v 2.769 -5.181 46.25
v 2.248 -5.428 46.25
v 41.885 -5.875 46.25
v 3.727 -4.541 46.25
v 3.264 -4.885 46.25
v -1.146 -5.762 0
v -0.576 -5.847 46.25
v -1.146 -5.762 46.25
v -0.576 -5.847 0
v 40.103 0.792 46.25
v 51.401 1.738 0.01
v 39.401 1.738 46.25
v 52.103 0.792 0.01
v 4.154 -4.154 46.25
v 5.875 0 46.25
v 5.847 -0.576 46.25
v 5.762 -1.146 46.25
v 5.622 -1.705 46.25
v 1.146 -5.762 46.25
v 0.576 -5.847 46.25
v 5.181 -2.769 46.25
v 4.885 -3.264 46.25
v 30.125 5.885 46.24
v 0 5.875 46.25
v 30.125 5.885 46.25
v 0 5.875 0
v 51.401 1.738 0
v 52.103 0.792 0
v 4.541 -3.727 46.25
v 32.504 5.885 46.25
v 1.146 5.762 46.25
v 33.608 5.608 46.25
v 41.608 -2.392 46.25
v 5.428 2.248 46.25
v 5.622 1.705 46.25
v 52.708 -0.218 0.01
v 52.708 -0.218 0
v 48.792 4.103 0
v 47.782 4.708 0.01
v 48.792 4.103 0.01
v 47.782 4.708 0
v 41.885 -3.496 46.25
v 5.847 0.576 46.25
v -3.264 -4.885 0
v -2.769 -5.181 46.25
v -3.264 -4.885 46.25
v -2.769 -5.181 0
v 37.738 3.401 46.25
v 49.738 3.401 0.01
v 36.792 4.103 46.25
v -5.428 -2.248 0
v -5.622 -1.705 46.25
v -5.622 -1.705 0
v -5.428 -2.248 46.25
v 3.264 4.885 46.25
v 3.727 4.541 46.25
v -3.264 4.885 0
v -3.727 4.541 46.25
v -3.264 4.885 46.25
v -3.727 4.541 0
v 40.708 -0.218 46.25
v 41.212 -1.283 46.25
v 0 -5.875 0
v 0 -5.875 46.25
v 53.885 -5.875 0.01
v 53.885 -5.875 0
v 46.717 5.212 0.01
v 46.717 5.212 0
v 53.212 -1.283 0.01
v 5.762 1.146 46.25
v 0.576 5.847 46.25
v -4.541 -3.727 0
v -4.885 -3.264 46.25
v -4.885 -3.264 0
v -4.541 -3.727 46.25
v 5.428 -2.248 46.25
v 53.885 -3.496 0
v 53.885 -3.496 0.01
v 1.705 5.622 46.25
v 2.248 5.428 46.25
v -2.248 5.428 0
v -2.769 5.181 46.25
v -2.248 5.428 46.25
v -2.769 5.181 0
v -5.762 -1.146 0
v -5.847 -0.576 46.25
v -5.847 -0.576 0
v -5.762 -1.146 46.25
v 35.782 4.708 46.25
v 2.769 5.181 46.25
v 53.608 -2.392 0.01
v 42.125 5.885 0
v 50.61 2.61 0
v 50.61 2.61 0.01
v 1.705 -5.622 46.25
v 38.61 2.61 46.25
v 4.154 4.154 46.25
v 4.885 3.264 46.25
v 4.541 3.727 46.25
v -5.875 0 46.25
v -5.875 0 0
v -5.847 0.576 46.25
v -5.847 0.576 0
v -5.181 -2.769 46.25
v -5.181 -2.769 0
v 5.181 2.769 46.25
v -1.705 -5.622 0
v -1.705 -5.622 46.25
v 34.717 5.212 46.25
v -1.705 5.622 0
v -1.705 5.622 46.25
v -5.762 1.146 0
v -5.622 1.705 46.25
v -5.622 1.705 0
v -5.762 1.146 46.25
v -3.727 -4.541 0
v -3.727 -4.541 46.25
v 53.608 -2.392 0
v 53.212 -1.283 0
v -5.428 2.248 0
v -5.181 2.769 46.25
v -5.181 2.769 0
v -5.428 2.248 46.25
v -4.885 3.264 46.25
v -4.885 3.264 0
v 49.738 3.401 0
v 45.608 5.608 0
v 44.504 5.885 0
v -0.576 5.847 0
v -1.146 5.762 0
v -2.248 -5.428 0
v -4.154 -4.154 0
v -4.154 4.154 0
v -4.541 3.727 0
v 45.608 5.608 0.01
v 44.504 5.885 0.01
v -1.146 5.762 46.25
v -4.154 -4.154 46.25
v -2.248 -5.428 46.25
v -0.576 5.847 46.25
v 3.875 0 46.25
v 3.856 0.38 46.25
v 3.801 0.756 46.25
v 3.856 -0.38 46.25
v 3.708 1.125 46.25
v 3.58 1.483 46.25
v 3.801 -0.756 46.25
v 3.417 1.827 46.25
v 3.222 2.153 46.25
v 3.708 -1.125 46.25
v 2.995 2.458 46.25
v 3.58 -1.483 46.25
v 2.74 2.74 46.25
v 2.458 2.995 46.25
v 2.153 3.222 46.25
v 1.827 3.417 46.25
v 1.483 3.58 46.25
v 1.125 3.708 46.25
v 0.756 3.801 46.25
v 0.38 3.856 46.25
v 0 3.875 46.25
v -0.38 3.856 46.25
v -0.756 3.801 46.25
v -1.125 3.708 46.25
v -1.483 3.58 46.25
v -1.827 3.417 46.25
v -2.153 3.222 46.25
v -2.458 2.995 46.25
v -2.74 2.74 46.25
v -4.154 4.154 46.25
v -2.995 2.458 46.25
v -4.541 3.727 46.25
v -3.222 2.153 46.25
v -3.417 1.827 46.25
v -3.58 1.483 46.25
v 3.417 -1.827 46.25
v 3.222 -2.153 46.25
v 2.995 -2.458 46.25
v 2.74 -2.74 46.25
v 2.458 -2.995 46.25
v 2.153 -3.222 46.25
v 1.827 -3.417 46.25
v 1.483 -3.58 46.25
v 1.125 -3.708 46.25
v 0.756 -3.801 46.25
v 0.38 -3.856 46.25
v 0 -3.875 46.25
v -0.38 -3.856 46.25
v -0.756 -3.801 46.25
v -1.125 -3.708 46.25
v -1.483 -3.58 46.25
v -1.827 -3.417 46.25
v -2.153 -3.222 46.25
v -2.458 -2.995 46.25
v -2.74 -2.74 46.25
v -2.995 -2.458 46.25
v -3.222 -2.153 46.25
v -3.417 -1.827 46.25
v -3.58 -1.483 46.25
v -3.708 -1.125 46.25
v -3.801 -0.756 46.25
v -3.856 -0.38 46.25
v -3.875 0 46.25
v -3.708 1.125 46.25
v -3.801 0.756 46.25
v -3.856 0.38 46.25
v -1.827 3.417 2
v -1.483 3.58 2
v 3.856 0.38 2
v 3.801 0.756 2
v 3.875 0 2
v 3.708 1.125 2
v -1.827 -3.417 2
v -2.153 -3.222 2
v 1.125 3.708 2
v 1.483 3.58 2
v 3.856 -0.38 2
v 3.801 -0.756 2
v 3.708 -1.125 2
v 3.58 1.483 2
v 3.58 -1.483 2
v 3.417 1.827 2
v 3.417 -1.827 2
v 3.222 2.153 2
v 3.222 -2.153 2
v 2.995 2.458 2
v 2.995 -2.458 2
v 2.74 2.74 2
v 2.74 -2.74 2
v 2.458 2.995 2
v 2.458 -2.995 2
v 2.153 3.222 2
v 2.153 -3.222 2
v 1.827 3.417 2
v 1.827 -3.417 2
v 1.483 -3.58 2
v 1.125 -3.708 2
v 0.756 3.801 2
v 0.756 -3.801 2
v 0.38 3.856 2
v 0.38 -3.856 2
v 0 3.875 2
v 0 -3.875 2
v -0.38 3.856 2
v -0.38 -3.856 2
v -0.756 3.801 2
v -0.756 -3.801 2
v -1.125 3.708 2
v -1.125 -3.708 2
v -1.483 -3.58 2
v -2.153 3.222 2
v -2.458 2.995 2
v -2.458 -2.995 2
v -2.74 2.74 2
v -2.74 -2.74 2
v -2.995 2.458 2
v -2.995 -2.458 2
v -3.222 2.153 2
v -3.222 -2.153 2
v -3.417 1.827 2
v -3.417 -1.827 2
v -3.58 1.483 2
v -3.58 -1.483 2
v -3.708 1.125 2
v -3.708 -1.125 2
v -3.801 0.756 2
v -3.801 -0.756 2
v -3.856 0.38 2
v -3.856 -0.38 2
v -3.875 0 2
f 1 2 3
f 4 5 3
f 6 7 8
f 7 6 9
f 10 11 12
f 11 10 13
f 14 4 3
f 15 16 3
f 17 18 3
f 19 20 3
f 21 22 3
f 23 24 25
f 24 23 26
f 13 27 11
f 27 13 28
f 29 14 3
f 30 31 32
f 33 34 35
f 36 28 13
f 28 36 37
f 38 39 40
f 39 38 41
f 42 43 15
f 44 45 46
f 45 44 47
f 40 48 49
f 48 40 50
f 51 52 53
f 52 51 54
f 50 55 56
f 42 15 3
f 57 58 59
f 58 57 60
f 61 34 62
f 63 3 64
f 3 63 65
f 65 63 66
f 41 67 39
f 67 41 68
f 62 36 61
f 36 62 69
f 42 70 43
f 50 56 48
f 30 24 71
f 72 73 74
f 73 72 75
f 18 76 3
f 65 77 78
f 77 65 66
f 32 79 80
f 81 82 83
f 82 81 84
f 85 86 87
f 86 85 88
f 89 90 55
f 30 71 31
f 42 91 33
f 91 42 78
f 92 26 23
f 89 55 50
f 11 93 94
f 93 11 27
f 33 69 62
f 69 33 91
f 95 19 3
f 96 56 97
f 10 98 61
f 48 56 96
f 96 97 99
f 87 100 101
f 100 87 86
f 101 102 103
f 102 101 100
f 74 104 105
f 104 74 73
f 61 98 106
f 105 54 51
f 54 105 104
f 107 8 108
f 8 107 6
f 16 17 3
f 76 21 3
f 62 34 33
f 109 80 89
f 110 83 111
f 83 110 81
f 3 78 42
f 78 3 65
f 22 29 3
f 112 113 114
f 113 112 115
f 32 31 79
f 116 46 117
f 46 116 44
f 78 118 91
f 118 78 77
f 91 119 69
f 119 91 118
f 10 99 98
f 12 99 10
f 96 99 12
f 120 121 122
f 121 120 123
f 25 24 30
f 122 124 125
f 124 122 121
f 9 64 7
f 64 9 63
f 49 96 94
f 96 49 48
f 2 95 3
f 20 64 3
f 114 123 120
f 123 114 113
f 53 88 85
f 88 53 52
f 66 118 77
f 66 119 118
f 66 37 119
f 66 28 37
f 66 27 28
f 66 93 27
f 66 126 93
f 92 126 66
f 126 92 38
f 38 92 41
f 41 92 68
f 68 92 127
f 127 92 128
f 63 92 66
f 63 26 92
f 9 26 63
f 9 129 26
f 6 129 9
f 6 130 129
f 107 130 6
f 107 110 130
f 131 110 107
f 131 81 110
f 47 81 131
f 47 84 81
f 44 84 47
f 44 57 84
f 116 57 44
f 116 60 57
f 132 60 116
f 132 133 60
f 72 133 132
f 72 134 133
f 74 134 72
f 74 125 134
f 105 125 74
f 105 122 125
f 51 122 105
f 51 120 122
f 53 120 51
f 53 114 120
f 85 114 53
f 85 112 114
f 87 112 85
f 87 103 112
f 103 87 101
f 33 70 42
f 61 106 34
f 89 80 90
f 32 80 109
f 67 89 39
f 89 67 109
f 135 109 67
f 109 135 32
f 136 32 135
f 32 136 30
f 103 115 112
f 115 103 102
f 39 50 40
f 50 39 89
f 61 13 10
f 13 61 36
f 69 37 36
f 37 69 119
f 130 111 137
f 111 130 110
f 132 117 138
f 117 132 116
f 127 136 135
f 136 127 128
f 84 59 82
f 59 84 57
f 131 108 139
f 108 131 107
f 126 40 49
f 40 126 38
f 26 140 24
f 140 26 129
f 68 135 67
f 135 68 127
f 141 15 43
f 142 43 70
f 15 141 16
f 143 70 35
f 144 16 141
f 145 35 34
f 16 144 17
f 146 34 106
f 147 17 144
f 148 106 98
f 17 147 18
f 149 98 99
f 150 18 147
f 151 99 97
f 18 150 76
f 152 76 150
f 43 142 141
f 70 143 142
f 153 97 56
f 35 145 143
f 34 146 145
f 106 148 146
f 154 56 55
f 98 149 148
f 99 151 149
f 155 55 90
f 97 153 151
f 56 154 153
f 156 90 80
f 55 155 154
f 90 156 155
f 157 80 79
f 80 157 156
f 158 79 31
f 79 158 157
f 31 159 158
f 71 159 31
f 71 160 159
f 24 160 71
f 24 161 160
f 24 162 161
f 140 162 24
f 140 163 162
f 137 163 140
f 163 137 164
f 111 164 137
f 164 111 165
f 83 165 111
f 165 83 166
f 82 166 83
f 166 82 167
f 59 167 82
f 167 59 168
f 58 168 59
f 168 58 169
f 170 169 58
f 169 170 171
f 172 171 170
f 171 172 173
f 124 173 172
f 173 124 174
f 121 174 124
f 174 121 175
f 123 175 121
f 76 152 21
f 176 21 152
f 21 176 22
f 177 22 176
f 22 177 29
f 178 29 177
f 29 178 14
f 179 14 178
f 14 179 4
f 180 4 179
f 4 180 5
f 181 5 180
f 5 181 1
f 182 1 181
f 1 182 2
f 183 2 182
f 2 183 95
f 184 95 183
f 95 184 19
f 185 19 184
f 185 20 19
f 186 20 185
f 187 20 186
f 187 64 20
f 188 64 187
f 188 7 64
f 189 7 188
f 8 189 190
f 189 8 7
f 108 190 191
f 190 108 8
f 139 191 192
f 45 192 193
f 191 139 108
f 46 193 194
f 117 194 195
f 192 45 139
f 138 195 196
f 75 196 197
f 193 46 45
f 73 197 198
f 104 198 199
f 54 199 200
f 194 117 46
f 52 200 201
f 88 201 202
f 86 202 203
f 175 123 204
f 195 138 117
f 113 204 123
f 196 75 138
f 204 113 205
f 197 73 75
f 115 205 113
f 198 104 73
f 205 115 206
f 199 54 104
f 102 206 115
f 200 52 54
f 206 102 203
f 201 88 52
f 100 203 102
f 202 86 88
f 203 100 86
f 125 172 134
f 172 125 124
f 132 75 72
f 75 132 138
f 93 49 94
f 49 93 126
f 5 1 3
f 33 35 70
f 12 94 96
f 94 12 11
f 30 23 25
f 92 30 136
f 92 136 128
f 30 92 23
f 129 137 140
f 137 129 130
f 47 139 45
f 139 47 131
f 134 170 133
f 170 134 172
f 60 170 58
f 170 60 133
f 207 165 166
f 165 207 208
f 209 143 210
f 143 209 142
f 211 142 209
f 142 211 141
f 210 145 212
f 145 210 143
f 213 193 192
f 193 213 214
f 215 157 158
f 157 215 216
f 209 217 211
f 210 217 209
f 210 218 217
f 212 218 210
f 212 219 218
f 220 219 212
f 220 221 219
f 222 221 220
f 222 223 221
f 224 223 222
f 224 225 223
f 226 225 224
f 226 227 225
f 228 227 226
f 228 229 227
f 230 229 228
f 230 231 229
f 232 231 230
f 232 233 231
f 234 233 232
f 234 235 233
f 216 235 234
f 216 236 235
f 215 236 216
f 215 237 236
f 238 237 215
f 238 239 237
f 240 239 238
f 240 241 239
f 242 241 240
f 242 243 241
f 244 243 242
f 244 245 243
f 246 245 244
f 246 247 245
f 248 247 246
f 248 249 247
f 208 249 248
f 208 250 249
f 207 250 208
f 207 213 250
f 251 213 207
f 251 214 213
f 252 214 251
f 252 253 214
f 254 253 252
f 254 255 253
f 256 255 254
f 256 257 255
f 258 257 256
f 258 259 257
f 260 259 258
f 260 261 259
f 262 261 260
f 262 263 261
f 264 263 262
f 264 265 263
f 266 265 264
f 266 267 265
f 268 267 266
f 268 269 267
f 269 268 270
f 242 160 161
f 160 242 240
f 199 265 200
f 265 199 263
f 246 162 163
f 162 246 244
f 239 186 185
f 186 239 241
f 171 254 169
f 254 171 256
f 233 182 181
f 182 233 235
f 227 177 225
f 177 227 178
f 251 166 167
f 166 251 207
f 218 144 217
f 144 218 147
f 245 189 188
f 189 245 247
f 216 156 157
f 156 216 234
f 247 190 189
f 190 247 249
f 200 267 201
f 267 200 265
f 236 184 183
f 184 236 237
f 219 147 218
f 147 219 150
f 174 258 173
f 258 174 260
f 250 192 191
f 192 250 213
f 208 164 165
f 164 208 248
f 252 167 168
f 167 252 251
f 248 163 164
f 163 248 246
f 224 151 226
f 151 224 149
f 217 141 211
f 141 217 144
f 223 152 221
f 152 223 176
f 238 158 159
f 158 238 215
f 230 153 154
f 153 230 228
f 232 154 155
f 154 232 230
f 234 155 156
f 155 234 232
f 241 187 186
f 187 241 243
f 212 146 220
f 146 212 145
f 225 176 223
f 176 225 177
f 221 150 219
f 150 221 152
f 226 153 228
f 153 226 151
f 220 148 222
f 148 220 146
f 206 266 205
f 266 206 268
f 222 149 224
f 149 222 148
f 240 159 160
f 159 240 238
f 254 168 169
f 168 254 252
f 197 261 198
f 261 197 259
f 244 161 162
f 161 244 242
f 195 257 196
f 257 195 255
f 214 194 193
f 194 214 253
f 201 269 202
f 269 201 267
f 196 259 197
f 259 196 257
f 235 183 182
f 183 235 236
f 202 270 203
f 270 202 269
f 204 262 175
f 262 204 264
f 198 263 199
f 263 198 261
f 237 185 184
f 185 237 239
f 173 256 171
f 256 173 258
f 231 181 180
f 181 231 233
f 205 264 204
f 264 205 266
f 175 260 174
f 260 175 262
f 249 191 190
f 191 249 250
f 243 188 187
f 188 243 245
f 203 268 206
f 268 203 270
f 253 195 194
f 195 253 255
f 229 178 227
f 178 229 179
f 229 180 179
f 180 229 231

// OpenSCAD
// Iron table grip with safety lock
// (c) 2020 Michiel Fokke <michiel@fokke.org>
// License: CC BY-SA 2.0
// https://creativecommons.org/licenses/by-sa/2.0/legalcode

$fn = 64;
TOL = .01;

GRIP_HEIGHT = 58;
WALL = 2;
ROD_D = 7.75;
WIDTH_BOTTOM = 48 + ROD_D + WALL;
WIDTH_TOP = WIDTH_BOTTOM - 12;

module  top() {
    r = ROD_D + 2*WALL;
    translate([-r/2, -r/2, 0]) 
        intersection() {
            cylinder(h = TOL, r = 12);
            translate([0, 0, -TOL]) cube([r+TOL, r+TOL, 3*TOL]);
        }
}

module iron_table_grip_base() {
    hull() {
        d = ROD_D + 2*WALL;
        x = ROD_D + WALL;
        z = GRIP_HEIGHT - d - TOL;
        cylinder(d = d, h = TOL);
        translate([0, 0, z]) cylinder(d = d, h = TOL);
        translate([WIDTH_BOTTOM - x, 0, 0]) top();
        translate([WIDTH_TOP - x, 0, z]) top();
    }
}

module iron_table_grip(ARGS) {
  difference() {
    iron_table_grip_base();
    translate([0, 0, WALL]) cylinder(d = ROD_D, h = GRIP_HEIGHT); 
  }
}

iron_table_grip();
